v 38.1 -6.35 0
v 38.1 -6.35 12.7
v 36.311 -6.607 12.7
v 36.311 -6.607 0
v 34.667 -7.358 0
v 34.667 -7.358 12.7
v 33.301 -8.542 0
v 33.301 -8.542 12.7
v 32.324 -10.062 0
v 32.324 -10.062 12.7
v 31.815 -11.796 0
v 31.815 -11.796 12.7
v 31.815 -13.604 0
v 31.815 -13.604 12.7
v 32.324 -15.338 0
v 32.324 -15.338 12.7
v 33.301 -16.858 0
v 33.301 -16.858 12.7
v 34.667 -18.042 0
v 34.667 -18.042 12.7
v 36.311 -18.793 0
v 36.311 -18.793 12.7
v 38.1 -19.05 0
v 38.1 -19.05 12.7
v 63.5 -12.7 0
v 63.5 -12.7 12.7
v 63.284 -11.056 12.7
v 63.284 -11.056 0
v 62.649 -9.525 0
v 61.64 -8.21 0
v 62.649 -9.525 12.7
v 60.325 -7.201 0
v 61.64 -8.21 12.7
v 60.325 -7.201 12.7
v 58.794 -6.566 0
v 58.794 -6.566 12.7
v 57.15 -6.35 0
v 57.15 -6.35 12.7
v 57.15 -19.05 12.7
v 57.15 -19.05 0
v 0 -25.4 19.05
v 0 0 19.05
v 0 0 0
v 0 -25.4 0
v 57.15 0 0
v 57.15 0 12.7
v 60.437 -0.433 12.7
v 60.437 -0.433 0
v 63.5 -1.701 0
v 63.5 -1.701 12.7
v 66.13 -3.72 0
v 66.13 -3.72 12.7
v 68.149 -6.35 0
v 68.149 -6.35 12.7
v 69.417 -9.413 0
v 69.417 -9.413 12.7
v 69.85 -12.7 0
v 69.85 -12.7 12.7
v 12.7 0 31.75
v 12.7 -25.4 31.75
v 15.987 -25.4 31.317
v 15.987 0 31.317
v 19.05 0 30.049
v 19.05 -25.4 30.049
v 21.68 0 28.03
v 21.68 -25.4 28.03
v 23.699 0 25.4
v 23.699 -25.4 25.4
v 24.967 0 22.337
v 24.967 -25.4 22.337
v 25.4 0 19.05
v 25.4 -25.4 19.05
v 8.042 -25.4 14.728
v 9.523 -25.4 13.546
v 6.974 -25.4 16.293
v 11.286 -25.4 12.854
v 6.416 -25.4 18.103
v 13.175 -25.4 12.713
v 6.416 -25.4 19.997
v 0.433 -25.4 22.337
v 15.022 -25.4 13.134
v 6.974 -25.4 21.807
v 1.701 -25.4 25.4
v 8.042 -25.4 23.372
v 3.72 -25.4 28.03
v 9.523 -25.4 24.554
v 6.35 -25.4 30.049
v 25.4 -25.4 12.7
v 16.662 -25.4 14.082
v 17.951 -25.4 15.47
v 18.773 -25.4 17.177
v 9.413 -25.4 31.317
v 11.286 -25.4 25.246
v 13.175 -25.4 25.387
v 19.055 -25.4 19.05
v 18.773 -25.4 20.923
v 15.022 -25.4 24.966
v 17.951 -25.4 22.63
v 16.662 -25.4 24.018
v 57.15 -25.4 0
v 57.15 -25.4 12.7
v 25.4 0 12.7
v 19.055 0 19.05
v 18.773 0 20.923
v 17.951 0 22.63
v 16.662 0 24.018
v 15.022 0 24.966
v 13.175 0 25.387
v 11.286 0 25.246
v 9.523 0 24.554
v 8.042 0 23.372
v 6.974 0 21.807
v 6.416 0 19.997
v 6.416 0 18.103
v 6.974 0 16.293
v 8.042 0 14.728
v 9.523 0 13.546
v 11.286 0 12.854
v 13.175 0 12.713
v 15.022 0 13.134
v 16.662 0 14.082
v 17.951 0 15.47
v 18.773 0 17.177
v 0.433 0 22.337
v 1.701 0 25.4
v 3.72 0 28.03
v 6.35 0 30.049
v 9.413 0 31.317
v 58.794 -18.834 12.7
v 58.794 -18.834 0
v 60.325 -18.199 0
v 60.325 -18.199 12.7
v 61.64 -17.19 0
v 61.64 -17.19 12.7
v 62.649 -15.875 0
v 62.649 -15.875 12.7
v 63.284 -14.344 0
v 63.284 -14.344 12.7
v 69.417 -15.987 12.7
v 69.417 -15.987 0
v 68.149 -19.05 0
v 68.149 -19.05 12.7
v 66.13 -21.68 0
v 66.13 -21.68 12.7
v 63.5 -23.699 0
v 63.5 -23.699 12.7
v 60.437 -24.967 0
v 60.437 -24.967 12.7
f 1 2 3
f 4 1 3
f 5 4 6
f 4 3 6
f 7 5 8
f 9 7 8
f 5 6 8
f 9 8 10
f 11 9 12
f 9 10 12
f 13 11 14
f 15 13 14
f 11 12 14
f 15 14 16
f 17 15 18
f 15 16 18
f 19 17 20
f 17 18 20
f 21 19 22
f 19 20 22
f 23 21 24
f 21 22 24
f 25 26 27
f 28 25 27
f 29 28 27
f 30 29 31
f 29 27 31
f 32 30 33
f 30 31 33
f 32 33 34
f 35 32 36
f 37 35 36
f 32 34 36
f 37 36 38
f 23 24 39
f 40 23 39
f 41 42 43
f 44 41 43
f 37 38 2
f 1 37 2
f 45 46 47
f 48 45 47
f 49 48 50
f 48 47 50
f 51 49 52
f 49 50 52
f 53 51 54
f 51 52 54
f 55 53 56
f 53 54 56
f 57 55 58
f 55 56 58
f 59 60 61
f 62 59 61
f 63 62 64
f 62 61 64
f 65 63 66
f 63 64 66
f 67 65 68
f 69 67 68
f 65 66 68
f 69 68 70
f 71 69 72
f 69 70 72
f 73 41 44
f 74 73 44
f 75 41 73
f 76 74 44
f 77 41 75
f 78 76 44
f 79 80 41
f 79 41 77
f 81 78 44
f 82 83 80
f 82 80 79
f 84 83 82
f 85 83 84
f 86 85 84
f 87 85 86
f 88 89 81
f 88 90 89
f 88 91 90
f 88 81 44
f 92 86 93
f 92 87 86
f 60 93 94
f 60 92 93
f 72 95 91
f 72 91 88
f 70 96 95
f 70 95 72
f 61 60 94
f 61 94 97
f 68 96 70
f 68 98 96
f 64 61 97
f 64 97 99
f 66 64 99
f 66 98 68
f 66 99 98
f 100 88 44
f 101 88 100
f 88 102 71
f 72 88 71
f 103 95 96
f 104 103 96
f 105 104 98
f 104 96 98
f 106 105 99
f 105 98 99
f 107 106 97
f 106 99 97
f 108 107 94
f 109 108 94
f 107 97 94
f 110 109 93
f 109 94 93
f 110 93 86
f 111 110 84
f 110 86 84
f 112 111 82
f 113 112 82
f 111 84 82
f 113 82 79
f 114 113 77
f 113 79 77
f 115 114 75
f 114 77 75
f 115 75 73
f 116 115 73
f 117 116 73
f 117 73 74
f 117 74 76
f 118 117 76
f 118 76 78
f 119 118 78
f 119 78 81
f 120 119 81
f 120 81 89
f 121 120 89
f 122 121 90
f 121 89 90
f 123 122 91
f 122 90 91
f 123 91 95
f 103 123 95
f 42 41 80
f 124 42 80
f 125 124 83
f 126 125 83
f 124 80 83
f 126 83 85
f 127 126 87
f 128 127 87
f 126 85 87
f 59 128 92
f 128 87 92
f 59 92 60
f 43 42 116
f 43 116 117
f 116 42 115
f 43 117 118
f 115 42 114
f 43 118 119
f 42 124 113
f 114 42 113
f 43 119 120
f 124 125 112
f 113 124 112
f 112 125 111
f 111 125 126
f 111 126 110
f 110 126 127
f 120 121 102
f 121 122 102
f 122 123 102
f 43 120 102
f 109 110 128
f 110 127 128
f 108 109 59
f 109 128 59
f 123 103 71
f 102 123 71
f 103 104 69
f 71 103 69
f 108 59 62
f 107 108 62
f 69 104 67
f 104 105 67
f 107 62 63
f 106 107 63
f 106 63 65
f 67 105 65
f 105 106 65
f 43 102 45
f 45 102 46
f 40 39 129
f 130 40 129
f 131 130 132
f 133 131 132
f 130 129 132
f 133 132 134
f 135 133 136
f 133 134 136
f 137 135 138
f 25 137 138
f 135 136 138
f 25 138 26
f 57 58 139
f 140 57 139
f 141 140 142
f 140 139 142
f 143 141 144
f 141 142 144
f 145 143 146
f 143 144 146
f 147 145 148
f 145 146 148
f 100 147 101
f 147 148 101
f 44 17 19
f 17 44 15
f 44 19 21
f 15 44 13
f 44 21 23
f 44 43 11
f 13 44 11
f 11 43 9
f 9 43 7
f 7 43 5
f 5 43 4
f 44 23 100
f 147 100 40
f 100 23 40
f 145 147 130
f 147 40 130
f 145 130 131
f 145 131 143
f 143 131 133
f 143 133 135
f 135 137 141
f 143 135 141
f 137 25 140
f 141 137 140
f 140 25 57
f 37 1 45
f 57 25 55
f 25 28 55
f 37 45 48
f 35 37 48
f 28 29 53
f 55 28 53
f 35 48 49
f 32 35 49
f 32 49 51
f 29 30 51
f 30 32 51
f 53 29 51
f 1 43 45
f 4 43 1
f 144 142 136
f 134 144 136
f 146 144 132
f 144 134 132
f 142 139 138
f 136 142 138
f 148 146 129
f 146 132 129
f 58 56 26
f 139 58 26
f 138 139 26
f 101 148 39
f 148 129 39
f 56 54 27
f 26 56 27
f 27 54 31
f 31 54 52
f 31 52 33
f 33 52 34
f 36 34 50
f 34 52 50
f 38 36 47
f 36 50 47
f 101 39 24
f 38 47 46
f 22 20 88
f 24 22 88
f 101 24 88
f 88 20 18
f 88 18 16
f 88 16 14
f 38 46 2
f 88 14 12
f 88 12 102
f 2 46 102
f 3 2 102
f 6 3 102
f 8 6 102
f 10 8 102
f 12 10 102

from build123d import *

# Parameters (mm, degrees)
F1_DEPTH = 25.4
F2_R     = 6.354917
F3_DEPTH = 25.4
F5_DEPTH = 25.4


with BuildPart() as f1:
    # F0 (on Front) → F1 (new body)
    with BuildSketch(Plane.XZ):
        Polygon((0, 31.75), (0, 0), (69.85, 0), (69.85, 12.7), (25.4, 12.7), (25.4, 31.75), align=None)
    extrude(amount=F1_DEPTH)

    # F2 (on face) → F3 (cut)
    with BuildSketch(Plane.XZ.offset(25.4)):
        with BuildLine():
            ThreePointArc((12.7, 31.75), (21.680256, 28.030256), (25.4, 19.05))
            Line((25.4, 19.05), (25.4, 31.75))
            Line((25.4, 31.75), (12.7, 31.75))
        make_face()
        with BuildLine():
            ThreePointArc((0, 19.05), (3.719744, 28.030256), (12.7, 31.75))
            Line((12.7, 31.75), (0, 31.75))
            Line((0, 31.75), (0, 19.05))
        make_face()
        with Locations((12.7, 19.05)):
            Circle(F2_R)
    extrude(amount=-F3_DEPTH, mode=Mode.SUBTRACT)

    # F4 (on face) → F5 (cut)
    with BuildSketch(Plane.XY.offset(12.7)):
        with BuildLine():
            ThreePointArc((38.1, -19.05), (42.590128, -17.190128), (44.45, -12.7))
            ThreePointArc((44.45, -12.7), (42.590128, -8.209872), (38.1, -6.35))
            ThreePointArc((38.1, -6.35), (31.75, -12.7), (38.1, -19.05))
        make_face()
        with BuildLine():
            ThreePointArc((38.1, -6.35), (42.590128, -8.209872), (44.45, -12.7))
            ThreePointArc((44.45, -12.7), (42.590128, -17.190128), (38.1, -19.05))
            Line((38.1, -19.05), (57.15, -19.05))
            ThreePointArc((57.15, -19.05), (50.8, -12.7), (57.15, -6.35))
            Line((57.15, -6.35), (38.1, -6.35))
        make_face()
        with BuildLine():
            ThreePointArc((63.5, -12.7), (61.640128, -8.209872), (57.15, -6.35))
            ThreePointArc((57.15, -6.35), (50.8, -12.7), (57.15, -19.05))
            ThreePointArc((57.15, -19.05), (61.640128, -17.190128), (63.5, -12.7))
        make_face()
        with BuildLine():
            ThreePointArc((57.15, 0), (66.130256, -3.719744), (69.85, -12.7))
            Line((69.85, -12.7), (69.85, 0))
            Line((69.85, 0), (57.15, 0))
        make_face()
        with BuildLine():
            ThreePointArc((69.85, -12.7), (66.130256, -21.680256), (57.15, -25.4))
            Line((57.15, -25.4), (69.85, -25.4))
            Line((69.85, -25.4), (69.85, -12.7))
        make_face()
    extrude(amount=-F5_DEPTH, mode=Mode.SUBTRACT)


solid = f1.part
